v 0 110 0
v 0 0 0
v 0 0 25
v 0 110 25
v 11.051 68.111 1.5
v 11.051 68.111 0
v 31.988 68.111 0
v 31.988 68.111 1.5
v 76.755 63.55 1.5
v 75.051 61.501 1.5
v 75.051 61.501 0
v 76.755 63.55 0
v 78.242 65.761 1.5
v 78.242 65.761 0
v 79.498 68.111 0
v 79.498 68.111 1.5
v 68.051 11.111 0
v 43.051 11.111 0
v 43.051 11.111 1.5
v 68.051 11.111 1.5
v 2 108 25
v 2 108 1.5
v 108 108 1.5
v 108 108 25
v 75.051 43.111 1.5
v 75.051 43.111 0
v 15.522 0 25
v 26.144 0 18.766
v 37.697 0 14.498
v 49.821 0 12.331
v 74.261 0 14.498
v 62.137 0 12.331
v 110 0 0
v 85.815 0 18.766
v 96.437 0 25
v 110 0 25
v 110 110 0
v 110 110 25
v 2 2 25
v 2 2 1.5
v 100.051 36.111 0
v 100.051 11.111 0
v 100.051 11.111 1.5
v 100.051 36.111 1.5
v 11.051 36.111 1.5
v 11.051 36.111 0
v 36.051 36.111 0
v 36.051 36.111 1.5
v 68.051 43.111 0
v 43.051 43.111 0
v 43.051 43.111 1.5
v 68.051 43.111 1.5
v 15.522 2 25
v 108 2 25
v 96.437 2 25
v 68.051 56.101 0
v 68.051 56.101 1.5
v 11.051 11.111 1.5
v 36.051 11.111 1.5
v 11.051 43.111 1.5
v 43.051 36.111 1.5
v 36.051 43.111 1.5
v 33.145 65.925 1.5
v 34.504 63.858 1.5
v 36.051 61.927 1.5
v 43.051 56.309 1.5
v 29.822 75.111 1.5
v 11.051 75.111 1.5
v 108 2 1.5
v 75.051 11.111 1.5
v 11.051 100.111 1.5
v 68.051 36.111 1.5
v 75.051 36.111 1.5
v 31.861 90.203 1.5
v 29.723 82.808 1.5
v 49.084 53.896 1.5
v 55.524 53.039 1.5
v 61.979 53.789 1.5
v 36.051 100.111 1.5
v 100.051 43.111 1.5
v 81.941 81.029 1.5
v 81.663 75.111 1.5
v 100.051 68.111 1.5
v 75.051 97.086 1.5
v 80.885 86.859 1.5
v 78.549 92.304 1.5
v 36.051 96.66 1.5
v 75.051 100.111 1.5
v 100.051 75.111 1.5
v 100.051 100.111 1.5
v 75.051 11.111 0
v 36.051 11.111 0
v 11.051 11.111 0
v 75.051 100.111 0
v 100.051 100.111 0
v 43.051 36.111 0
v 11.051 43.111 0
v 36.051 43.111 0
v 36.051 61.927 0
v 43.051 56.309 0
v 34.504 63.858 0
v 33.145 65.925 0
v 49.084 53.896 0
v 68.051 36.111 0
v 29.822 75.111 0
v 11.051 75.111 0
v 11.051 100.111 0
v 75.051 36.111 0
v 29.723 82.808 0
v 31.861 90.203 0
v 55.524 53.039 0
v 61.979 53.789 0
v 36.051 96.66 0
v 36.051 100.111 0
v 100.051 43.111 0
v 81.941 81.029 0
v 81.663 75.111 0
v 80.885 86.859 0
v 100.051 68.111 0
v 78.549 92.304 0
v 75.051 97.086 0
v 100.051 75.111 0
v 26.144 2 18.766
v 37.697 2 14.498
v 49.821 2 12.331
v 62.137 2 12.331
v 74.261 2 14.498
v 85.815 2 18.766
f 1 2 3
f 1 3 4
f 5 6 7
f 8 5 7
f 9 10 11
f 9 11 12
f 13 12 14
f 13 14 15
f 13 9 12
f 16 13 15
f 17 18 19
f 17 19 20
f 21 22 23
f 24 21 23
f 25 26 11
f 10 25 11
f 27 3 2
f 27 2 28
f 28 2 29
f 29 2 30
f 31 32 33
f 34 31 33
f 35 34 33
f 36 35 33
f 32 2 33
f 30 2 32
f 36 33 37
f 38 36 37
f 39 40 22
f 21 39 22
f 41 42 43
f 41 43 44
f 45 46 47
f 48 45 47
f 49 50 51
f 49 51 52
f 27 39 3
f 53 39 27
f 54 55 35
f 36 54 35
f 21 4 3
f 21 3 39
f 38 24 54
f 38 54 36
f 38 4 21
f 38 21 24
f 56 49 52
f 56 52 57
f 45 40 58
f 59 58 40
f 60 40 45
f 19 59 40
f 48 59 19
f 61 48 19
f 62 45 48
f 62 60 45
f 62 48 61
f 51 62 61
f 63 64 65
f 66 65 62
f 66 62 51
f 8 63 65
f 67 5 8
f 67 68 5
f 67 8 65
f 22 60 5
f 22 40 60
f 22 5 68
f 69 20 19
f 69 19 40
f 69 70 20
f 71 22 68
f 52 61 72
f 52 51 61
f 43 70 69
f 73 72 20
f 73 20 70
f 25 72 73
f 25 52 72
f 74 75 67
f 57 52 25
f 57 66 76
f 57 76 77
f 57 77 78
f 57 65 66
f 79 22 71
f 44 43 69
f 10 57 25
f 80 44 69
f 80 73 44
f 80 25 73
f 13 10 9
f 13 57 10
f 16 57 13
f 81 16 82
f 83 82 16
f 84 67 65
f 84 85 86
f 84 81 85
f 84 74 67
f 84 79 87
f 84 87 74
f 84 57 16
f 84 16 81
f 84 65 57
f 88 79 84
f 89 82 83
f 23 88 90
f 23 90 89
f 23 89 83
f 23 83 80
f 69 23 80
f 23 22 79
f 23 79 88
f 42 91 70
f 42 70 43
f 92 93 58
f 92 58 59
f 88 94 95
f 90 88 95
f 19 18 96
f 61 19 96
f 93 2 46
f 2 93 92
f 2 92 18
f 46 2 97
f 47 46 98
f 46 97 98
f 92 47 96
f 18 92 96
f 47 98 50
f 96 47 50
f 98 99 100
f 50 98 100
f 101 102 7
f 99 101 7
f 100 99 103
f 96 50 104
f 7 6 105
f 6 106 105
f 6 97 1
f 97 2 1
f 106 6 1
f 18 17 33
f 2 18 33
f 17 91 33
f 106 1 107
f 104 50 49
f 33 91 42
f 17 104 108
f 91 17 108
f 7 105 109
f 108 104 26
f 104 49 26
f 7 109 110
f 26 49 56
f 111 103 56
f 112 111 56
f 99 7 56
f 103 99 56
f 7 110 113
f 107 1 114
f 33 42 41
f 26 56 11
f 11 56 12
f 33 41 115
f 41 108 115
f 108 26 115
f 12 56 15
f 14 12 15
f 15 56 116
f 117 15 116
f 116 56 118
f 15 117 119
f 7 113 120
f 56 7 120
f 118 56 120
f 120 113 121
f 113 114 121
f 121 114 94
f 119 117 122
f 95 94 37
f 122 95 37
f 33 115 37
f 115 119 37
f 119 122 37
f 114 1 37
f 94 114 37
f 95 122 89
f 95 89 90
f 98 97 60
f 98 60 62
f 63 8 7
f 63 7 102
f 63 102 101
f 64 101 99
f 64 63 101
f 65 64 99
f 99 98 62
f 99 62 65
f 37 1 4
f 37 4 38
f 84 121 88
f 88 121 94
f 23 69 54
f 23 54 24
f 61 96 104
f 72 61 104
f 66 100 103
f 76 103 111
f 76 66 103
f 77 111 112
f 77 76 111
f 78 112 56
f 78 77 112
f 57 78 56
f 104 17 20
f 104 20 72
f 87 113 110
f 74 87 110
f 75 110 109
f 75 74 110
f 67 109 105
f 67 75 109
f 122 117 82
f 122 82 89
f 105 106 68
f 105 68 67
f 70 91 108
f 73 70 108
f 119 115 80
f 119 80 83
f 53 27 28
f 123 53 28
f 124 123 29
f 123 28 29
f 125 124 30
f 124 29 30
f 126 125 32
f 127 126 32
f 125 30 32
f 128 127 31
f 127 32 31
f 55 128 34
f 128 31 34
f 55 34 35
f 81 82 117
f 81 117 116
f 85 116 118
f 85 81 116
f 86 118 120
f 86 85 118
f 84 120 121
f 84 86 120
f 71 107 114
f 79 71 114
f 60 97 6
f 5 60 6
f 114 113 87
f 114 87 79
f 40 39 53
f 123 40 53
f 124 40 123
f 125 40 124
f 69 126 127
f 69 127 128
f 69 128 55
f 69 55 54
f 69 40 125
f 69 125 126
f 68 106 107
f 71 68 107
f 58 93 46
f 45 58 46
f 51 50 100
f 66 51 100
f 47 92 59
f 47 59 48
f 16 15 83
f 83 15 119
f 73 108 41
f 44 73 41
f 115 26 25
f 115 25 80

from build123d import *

# Parameters (mm, degrees)
F0_W     = 110
F0_H     = 110
F0_W_2   = 106
F0_H_2   = 106
F1_DEPTH = 25
F2_W     = 106
F2_H     = 106
F3_DEPTH = 1.5
F4_W     = 25
F4_H     = 25
F5_DEPTH = 25
F6_R     = 26.255837
F7_DEPTH = 1.5
F9_DEPTH = 25


with BuildPart() as f1:
    # F0 (on Top) → F1 (new body)
    with BuildSketch(Plane.XY):
        with Locations((55, 55)):
            Rectangle(F0_W, F0_H)
        with Locations((55, 55)):
            Rectangle(F0_W_2, F0_H_2, mode=Mode.SUBTRACT)
    extrude(amount=F1_DEPTH)

    # F2 (on Top) → F3 (join)
    with BuildSketch(Plane.XY):
        with Locations((55, 55)):
            Rectangle(F2_W, F2_H)
    extrude(amount=F3_DEPTH)

    # F4 (on Top) → F5 (cut)
    with BuildSketch(Plane.XY):
        with Locations((23.550745, 87.610851)):
            Rectangle(F4_W, F4_H)
        with Locations((23.550745, 55.610851)):
            Rectangle(F4_W, F4_H)
        with Locations((23.550745, 23.610851)):
            Rectangle(F4_W, F4_H)
        with Locations((55.550745, 87.610851)):
            Rectangle(F4_W, F4_H)
        with Locations((55.550745, 55.610851)):
            Rectangle(F4_W, F4_H)
        with Locations((55.550745, 23.610851)):
            Rectangle(F4_W, F4_H)
        with Locations((87.550745, 87.610851)):
            Rectangle(F4_W, F4_H)
        with Locations((87.550745, 55.610851)):
            Rectangle(F4_W, F4_H)
        with Locations((87.550745, 23.610851)):
            Rectangle(F4_W, F4_H)
    extrude(amount=F5_DEPTH, mode=Mode.SUBTRACT)

    # F6 (on face) → F7 (join, through all)
    with BuildSketch(Plane.XY.offset(1.5)):
        with Locations((55.742927, 79.293631)):
            Circle(F6_R)
    extrude(amount=-F7_DEPTH)

    # F8 (on face) → F9 (cut)
    with BuildSketch(Plane.XZ):
        with BuildLine():
            Line((100.912742, 28.472882), (10.870284, 28.621467))
            ThreePointArc((10.870284, 28.621467), (55.864304, 12.058173), (100.912742, 28.472882))
        make_face()
    extrude(amount=-F9_DEPTH, mode=Mode.SUBTRACT)


solid = f1.part
